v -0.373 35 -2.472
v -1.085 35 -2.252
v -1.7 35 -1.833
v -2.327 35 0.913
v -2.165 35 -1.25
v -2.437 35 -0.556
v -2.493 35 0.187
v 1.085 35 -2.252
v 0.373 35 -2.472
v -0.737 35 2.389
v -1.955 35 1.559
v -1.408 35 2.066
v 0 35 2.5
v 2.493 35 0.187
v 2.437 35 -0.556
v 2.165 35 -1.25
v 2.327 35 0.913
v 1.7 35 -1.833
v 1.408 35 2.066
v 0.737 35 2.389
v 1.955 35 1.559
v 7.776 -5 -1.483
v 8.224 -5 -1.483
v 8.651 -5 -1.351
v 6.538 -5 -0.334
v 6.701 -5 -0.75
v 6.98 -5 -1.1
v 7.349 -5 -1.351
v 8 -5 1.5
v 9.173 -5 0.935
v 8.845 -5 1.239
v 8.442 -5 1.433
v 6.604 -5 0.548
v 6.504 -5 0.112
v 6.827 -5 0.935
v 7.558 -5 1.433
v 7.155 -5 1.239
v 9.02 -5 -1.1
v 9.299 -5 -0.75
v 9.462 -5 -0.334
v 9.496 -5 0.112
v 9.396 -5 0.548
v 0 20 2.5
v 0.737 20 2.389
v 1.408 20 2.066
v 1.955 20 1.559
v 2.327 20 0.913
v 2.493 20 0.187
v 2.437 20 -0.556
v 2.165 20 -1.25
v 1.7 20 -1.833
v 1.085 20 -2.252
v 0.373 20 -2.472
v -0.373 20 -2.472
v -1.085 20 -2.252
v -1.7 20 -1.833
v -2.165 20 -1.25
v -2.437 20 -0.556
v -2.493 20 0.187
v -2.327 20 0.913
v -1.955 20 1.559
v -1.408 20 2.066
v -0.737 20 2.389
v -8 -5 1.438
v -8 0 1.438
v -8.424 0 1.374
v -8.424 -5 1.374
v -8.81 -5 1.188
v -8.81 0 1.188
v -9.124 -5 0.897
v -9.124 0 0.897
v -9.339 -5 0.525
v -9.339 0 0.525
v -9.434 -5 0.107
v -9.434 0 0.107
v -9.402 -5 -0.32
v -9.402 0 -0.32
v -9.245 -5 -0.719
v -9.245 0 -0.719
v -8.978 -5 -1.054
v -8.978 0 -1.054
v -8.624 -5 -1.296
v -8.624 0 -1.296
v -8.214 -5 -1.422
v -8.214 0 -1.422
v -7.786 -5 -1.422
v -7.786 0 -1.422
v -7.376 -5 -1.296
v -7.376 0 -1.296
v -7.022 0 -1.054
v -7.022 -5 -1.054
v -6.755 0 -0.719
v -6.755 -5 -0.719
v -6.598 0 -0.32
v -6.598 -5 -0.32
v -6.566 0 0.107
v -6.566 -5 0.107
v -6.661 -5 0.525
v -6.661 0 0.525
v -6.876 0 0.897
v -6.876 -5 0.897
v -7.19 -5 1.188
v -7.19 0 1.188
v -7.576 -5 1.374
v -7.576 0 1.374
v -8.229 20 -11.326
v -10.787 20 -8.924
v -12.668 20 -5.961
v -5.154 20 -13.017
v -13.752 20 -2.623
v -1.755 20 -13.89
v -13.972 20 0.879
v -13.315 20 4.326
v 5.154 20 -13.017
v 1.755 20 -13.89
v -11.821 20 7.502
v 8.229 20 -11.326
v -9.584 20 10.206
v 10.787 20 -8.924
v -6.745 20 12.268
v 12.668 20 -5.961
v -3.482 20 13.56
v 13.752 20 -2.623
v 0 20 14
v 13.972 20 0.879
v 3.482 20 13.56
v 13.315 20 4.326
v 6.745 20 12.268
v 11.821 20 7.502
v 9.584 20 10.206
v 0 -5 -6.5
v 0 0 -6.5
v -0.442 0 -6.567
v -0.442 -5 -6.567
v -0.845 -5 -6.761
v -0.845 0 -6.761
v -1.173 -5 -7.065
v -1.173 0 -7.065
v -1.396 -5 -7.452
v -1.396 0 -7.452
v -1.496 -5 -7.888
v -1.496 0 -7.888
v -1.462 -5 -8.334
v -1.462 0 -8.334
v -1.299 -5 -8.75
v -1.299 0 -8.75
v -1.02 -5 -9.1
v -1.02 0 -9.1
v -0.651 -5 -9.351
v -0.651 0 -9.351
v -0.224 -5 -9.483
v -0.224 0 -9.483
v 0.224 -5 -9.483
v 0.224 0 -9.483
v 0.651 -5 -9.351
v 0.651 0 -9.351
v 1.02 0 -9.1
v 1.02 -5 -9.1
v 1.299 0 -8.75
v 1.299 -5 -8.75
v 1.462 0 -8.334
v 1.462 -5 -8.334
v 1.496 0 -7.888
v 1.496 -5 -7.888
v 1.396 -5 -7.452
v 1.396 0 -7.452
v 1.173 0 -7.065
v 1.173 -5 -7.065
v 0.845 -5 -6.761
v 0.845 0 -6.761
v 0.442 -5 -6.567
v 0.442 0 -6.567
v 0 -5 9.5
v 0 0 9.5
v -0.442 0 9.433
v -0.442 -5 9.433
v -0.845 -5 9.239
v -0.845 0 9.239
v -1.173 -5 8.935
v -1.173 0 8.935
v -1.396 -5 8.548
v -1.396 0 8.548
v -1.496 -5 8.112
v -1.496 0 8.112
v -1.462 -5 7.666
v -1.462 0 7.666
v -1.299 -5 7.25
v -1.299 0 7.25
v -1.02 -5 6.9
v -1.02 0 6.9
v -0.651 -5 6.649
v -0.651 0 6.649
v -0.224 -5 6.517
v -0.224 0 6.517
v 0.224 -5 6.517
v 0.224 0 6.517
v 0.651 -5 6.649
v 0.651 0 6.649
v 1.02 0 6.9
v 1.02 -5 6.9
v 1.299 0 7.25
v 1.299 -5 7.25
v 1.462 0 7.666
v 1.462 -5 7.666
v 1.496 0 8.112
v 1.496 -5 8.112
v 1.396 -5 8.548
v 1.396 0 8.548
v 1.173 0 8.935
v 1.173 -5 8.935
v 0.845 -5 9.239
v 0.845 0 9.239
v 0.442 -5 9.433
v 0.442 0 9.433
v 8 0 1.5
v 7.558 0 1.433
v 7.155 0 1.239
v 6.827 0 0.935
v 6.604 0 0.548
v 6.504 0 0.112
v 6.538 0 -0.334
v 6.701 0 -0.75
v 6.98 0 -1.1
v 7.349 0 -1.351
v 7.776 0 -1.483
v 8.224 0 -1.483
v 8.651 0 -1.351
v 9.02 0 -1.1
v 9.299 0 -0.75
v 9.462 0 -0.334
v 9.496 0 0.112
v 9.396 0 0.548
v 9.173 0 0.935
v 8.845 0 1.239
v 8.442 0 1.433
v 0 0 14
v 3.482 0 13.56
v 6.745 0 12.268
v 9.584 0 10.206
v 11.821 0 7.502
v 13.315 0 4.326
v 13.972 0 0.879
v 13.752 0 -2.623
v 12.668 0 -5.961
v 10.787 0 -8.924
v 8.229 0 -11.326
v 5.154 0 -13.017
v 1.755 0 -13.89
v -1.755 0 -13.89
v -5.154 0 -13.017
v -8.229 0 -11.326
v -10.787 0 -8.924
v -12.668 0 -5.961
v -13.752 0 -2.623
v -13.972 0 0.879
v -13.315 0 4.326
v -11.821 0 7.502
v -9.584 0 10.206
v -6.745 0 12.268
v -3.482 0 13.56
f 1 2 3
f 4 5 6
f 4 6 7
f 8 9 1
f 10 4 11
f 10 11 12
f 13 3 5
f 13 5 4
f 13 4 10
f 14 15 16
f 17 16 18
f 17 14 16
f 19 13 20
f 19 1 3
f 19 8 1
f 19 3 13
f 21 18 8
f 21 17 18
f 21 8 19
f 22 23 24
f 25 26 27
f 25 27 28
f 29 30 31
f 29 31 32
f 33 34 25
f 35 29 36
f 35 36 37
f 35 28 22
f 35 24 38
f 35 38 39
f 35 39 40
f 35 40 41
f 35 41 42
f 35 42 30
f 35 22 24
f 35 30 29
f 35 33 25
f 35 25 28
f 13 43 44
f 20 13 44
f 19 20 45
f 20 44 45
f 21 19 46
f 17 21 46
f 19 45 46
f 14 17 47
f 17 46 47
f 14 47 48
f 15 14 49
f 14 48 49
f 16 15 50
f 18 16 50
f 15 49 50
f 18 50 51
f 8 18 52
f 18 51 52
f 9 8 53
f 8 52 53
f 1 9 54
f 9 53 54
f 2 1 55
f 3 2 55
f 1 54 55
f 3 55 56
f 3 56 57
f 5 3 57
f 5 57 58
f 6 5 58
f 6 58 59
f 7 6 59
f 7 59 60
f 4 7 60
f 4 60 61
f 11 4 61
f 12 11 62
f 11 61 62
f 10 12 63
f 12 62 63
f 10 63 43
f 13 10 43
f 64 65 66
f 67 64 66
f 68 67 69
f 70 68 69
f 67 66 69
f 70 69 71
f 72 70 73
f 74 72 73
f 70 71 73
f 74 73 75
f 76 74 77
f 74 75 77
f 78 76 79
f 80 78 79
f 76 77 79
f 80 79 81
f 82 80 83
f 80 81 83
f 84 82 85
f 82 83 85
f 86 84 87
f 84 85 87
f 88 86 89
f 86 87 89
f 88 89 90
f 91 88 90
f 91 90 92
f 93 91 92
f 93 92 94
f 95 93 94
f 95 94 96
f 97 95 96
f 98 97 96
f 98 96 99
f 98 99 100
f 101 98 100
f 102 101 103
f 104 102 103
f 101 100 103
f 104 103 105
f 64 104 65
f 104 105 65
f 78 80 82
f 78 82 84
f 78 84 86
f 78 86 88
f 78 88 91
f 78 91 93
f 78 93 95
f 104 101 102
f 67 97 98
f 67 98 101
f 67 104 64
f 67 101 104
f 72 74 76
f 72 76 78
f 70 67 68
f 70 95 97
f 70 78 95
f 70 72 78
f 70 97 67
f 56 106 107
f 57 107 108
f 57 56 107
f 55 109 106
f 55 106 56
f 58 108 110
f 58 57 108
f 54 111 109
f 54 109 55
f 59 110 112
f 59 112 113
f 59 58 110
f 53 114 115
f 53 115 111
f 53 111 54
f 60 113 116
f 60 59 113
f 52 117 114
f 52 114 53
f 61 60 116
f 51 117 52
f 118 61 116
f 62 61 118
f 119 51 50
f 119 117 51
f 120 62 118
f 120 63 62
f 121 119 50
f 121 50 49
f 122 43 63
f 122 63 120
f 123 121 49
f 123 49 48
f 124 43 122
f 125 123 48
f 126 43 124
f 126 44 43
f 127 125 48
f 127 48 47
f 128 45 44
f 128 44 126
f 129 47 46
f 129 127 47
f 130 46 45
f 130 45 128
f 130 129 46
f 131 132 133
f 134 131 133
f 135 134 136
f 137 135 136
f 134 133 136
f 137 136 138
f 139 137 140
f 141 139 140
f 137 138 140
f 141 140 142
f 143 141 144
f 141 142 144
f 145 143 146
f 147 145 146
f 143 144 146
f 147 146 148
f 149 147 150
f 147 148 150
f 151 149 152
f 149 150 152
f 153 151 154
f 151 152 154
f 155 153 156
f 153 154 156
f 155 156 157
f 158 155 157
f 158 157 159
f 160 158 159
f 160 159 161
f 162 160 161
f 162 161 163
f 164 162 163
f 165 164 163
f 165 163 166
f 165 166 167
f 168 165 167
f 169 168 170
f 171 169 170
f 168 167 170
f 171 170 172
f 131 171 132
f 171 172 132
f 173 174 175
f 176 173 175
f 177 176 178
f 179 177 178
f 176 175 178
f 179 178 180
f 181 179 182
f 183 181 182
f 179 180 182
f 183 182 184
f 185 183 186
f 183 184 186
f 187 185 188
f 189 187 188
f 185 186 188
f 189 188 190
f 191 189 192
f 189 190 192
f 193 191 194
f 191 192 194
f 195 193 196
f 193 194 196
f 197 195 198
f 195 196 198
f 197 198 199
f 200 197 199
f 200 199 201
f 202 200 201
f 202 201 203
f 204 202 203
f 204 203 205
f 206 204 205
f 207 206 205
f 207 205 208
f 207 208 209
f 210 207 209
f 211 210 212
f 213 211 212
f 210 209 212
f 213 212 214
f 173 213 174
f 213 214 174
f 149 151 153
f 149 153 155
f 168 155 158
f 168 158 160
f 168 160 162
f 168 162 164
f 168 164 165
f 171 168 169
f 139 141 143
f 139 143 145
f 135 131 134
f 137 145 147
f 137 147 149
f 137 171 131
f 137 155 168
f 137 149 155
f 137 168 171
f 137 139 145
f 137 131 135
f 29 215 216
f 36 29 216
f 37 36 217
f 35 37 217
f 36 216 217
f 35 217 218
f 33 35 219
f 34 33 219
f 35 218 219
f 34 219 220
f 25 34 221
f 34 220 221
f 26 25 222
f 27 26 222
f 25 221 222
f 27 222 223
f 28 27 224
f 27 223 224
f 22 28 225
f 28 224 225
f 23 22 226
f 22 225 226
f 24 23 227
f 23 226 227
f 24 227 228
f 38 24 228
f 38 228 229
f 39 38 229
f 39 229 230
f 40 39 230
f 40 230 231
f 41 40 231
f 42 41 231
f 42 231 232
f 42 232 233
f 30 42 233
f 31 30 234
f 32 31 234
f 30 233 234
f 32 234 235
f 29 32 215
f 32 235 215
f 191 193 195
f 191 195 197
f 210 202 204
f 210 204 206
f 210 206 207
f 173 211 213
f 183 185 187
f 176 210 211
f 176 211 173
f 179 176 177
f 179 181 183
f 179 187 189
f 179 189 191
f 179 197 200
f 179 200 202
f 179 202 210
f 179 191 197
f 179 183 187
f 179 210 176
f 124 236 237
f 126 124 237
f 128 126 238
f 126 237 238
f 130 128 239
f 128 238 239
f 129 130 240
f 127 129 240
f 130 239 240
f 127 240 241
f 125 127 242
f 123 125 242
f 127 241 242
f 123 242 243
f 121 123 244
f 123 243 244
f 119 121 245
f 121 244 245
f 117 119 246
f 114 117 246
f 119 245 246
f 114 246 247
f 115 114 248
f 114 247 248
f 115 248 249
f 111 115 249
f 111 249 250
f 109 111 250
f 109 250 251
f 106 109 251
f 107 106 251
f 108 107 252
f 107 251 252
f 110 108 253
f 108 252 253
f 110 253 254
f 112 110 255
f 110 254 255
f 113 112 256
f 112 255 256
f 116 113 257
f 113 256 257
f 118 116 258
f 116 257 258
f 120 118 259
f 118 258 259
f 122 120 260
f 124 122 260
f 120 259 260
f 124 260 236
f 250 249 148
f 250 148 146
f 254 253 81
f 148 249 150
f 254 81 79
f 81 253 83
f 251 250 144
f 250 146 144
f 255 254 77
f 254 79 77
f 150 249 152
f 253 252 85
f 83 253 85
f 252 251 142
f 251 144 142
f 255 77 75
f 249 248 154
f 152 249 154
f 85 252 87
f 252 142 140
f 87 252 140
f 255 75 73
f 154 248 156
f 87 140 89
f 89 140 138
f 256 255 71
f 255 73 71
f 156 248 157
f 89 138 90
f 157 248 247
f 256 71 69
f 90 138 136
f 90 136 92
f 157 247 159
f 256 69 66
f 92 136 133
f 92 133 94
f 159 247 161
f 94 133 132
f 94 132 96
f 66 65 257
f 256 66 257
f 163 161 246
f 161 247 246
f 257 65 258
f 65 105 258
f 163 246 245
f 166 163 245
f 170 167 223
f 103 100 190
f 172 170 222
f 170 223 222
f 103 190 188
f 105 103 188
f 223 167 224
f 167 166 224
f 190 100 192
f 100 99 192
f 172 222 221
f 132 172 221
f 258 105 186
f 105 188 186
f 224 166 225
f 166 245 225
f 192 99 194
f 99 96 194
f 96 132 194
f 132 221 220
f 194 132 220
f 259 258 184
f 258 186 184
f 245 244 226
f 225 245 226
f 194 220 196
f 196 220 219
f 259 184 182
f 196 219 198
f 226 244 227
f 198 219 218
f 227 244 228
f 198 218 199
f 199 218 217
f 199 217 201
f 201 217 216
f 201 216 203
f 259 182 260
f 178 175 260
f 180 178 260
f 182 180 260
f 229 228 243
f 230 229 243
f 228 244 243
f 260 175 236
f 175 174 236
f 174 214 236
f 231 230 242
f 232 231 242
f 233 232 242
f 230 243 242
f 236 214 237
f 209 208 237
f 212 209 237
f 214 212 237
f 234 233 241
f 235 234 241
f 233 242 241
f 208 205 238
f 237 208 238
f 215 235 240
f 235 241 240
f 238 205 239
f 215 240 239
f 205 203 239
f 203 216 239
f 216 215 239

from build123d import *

# Parameters (mm, degrees)
ESQUISSE1_R        = 14
BOSS_EXTRU_1_DEPTH = 20
ESQUISSE2_R        = 2.5
BOSS_EXTRU_2_DEPTH = 15
ESQUISSE3_R        = 1.5
ESQUISSE3_R_2      = 1.438113866
BOSS_EXTRU_3_DEPTH = 5


with BuildPart() as part:
    # Esquisse1 → Boss.-Extru.1 (new body)
    with BuildSketch(Plane(origin=(0, 0, 0), x_dir=(1, 0, 0), z_dir=(0, 1, 0))):
        with Locations(Location((0, 0, 0), (0, 0, 270))):
            Circle(ESQUISSE1_R)
    extrude(amount=BOSS_EXTRU_1_DEPTH)

    # Esquisse2 → Boss.-Extru.2 (add)
    with BuildSketch(Plane(origin=(0, 20, 0), x_dir=(1, 0, 0), z_dir=(0, 1, 0))):
        with Locations(Location((0, 0, 0), (0, 0, 270))):
            Circle(ESQUISSE2_R)
    extrude(amount=BOSS_EXTRU_2_DEPTH)

    # Esquisse3 → Boss.-Extru.3 (add)
    with BuildSketch(Plane(origin=(0, 0, 0), x_dir=(-1, 0, 0), z_dir=(0, -1, 0))):
        with Locations(Location((-8, 0, 0), (0, 0, 270))):
            Circle(ESQUISSE3_R)
        with Locations(Location((0, 8, 0), (0, 0, 270))):
            Circle(ESQUISSE3_R)
        with Locations(Location((8, 0, 0), (0, 0, 270))):
            Circle(ESQUISSE3_R_2)
        with Locations(Location((0, -8, 0), (0, 0, 270))):
            Circle(ESQUISSE3_R)
    extrude(amount=BOSS_EXTRU_3_DEPTH)


solid = part.part
